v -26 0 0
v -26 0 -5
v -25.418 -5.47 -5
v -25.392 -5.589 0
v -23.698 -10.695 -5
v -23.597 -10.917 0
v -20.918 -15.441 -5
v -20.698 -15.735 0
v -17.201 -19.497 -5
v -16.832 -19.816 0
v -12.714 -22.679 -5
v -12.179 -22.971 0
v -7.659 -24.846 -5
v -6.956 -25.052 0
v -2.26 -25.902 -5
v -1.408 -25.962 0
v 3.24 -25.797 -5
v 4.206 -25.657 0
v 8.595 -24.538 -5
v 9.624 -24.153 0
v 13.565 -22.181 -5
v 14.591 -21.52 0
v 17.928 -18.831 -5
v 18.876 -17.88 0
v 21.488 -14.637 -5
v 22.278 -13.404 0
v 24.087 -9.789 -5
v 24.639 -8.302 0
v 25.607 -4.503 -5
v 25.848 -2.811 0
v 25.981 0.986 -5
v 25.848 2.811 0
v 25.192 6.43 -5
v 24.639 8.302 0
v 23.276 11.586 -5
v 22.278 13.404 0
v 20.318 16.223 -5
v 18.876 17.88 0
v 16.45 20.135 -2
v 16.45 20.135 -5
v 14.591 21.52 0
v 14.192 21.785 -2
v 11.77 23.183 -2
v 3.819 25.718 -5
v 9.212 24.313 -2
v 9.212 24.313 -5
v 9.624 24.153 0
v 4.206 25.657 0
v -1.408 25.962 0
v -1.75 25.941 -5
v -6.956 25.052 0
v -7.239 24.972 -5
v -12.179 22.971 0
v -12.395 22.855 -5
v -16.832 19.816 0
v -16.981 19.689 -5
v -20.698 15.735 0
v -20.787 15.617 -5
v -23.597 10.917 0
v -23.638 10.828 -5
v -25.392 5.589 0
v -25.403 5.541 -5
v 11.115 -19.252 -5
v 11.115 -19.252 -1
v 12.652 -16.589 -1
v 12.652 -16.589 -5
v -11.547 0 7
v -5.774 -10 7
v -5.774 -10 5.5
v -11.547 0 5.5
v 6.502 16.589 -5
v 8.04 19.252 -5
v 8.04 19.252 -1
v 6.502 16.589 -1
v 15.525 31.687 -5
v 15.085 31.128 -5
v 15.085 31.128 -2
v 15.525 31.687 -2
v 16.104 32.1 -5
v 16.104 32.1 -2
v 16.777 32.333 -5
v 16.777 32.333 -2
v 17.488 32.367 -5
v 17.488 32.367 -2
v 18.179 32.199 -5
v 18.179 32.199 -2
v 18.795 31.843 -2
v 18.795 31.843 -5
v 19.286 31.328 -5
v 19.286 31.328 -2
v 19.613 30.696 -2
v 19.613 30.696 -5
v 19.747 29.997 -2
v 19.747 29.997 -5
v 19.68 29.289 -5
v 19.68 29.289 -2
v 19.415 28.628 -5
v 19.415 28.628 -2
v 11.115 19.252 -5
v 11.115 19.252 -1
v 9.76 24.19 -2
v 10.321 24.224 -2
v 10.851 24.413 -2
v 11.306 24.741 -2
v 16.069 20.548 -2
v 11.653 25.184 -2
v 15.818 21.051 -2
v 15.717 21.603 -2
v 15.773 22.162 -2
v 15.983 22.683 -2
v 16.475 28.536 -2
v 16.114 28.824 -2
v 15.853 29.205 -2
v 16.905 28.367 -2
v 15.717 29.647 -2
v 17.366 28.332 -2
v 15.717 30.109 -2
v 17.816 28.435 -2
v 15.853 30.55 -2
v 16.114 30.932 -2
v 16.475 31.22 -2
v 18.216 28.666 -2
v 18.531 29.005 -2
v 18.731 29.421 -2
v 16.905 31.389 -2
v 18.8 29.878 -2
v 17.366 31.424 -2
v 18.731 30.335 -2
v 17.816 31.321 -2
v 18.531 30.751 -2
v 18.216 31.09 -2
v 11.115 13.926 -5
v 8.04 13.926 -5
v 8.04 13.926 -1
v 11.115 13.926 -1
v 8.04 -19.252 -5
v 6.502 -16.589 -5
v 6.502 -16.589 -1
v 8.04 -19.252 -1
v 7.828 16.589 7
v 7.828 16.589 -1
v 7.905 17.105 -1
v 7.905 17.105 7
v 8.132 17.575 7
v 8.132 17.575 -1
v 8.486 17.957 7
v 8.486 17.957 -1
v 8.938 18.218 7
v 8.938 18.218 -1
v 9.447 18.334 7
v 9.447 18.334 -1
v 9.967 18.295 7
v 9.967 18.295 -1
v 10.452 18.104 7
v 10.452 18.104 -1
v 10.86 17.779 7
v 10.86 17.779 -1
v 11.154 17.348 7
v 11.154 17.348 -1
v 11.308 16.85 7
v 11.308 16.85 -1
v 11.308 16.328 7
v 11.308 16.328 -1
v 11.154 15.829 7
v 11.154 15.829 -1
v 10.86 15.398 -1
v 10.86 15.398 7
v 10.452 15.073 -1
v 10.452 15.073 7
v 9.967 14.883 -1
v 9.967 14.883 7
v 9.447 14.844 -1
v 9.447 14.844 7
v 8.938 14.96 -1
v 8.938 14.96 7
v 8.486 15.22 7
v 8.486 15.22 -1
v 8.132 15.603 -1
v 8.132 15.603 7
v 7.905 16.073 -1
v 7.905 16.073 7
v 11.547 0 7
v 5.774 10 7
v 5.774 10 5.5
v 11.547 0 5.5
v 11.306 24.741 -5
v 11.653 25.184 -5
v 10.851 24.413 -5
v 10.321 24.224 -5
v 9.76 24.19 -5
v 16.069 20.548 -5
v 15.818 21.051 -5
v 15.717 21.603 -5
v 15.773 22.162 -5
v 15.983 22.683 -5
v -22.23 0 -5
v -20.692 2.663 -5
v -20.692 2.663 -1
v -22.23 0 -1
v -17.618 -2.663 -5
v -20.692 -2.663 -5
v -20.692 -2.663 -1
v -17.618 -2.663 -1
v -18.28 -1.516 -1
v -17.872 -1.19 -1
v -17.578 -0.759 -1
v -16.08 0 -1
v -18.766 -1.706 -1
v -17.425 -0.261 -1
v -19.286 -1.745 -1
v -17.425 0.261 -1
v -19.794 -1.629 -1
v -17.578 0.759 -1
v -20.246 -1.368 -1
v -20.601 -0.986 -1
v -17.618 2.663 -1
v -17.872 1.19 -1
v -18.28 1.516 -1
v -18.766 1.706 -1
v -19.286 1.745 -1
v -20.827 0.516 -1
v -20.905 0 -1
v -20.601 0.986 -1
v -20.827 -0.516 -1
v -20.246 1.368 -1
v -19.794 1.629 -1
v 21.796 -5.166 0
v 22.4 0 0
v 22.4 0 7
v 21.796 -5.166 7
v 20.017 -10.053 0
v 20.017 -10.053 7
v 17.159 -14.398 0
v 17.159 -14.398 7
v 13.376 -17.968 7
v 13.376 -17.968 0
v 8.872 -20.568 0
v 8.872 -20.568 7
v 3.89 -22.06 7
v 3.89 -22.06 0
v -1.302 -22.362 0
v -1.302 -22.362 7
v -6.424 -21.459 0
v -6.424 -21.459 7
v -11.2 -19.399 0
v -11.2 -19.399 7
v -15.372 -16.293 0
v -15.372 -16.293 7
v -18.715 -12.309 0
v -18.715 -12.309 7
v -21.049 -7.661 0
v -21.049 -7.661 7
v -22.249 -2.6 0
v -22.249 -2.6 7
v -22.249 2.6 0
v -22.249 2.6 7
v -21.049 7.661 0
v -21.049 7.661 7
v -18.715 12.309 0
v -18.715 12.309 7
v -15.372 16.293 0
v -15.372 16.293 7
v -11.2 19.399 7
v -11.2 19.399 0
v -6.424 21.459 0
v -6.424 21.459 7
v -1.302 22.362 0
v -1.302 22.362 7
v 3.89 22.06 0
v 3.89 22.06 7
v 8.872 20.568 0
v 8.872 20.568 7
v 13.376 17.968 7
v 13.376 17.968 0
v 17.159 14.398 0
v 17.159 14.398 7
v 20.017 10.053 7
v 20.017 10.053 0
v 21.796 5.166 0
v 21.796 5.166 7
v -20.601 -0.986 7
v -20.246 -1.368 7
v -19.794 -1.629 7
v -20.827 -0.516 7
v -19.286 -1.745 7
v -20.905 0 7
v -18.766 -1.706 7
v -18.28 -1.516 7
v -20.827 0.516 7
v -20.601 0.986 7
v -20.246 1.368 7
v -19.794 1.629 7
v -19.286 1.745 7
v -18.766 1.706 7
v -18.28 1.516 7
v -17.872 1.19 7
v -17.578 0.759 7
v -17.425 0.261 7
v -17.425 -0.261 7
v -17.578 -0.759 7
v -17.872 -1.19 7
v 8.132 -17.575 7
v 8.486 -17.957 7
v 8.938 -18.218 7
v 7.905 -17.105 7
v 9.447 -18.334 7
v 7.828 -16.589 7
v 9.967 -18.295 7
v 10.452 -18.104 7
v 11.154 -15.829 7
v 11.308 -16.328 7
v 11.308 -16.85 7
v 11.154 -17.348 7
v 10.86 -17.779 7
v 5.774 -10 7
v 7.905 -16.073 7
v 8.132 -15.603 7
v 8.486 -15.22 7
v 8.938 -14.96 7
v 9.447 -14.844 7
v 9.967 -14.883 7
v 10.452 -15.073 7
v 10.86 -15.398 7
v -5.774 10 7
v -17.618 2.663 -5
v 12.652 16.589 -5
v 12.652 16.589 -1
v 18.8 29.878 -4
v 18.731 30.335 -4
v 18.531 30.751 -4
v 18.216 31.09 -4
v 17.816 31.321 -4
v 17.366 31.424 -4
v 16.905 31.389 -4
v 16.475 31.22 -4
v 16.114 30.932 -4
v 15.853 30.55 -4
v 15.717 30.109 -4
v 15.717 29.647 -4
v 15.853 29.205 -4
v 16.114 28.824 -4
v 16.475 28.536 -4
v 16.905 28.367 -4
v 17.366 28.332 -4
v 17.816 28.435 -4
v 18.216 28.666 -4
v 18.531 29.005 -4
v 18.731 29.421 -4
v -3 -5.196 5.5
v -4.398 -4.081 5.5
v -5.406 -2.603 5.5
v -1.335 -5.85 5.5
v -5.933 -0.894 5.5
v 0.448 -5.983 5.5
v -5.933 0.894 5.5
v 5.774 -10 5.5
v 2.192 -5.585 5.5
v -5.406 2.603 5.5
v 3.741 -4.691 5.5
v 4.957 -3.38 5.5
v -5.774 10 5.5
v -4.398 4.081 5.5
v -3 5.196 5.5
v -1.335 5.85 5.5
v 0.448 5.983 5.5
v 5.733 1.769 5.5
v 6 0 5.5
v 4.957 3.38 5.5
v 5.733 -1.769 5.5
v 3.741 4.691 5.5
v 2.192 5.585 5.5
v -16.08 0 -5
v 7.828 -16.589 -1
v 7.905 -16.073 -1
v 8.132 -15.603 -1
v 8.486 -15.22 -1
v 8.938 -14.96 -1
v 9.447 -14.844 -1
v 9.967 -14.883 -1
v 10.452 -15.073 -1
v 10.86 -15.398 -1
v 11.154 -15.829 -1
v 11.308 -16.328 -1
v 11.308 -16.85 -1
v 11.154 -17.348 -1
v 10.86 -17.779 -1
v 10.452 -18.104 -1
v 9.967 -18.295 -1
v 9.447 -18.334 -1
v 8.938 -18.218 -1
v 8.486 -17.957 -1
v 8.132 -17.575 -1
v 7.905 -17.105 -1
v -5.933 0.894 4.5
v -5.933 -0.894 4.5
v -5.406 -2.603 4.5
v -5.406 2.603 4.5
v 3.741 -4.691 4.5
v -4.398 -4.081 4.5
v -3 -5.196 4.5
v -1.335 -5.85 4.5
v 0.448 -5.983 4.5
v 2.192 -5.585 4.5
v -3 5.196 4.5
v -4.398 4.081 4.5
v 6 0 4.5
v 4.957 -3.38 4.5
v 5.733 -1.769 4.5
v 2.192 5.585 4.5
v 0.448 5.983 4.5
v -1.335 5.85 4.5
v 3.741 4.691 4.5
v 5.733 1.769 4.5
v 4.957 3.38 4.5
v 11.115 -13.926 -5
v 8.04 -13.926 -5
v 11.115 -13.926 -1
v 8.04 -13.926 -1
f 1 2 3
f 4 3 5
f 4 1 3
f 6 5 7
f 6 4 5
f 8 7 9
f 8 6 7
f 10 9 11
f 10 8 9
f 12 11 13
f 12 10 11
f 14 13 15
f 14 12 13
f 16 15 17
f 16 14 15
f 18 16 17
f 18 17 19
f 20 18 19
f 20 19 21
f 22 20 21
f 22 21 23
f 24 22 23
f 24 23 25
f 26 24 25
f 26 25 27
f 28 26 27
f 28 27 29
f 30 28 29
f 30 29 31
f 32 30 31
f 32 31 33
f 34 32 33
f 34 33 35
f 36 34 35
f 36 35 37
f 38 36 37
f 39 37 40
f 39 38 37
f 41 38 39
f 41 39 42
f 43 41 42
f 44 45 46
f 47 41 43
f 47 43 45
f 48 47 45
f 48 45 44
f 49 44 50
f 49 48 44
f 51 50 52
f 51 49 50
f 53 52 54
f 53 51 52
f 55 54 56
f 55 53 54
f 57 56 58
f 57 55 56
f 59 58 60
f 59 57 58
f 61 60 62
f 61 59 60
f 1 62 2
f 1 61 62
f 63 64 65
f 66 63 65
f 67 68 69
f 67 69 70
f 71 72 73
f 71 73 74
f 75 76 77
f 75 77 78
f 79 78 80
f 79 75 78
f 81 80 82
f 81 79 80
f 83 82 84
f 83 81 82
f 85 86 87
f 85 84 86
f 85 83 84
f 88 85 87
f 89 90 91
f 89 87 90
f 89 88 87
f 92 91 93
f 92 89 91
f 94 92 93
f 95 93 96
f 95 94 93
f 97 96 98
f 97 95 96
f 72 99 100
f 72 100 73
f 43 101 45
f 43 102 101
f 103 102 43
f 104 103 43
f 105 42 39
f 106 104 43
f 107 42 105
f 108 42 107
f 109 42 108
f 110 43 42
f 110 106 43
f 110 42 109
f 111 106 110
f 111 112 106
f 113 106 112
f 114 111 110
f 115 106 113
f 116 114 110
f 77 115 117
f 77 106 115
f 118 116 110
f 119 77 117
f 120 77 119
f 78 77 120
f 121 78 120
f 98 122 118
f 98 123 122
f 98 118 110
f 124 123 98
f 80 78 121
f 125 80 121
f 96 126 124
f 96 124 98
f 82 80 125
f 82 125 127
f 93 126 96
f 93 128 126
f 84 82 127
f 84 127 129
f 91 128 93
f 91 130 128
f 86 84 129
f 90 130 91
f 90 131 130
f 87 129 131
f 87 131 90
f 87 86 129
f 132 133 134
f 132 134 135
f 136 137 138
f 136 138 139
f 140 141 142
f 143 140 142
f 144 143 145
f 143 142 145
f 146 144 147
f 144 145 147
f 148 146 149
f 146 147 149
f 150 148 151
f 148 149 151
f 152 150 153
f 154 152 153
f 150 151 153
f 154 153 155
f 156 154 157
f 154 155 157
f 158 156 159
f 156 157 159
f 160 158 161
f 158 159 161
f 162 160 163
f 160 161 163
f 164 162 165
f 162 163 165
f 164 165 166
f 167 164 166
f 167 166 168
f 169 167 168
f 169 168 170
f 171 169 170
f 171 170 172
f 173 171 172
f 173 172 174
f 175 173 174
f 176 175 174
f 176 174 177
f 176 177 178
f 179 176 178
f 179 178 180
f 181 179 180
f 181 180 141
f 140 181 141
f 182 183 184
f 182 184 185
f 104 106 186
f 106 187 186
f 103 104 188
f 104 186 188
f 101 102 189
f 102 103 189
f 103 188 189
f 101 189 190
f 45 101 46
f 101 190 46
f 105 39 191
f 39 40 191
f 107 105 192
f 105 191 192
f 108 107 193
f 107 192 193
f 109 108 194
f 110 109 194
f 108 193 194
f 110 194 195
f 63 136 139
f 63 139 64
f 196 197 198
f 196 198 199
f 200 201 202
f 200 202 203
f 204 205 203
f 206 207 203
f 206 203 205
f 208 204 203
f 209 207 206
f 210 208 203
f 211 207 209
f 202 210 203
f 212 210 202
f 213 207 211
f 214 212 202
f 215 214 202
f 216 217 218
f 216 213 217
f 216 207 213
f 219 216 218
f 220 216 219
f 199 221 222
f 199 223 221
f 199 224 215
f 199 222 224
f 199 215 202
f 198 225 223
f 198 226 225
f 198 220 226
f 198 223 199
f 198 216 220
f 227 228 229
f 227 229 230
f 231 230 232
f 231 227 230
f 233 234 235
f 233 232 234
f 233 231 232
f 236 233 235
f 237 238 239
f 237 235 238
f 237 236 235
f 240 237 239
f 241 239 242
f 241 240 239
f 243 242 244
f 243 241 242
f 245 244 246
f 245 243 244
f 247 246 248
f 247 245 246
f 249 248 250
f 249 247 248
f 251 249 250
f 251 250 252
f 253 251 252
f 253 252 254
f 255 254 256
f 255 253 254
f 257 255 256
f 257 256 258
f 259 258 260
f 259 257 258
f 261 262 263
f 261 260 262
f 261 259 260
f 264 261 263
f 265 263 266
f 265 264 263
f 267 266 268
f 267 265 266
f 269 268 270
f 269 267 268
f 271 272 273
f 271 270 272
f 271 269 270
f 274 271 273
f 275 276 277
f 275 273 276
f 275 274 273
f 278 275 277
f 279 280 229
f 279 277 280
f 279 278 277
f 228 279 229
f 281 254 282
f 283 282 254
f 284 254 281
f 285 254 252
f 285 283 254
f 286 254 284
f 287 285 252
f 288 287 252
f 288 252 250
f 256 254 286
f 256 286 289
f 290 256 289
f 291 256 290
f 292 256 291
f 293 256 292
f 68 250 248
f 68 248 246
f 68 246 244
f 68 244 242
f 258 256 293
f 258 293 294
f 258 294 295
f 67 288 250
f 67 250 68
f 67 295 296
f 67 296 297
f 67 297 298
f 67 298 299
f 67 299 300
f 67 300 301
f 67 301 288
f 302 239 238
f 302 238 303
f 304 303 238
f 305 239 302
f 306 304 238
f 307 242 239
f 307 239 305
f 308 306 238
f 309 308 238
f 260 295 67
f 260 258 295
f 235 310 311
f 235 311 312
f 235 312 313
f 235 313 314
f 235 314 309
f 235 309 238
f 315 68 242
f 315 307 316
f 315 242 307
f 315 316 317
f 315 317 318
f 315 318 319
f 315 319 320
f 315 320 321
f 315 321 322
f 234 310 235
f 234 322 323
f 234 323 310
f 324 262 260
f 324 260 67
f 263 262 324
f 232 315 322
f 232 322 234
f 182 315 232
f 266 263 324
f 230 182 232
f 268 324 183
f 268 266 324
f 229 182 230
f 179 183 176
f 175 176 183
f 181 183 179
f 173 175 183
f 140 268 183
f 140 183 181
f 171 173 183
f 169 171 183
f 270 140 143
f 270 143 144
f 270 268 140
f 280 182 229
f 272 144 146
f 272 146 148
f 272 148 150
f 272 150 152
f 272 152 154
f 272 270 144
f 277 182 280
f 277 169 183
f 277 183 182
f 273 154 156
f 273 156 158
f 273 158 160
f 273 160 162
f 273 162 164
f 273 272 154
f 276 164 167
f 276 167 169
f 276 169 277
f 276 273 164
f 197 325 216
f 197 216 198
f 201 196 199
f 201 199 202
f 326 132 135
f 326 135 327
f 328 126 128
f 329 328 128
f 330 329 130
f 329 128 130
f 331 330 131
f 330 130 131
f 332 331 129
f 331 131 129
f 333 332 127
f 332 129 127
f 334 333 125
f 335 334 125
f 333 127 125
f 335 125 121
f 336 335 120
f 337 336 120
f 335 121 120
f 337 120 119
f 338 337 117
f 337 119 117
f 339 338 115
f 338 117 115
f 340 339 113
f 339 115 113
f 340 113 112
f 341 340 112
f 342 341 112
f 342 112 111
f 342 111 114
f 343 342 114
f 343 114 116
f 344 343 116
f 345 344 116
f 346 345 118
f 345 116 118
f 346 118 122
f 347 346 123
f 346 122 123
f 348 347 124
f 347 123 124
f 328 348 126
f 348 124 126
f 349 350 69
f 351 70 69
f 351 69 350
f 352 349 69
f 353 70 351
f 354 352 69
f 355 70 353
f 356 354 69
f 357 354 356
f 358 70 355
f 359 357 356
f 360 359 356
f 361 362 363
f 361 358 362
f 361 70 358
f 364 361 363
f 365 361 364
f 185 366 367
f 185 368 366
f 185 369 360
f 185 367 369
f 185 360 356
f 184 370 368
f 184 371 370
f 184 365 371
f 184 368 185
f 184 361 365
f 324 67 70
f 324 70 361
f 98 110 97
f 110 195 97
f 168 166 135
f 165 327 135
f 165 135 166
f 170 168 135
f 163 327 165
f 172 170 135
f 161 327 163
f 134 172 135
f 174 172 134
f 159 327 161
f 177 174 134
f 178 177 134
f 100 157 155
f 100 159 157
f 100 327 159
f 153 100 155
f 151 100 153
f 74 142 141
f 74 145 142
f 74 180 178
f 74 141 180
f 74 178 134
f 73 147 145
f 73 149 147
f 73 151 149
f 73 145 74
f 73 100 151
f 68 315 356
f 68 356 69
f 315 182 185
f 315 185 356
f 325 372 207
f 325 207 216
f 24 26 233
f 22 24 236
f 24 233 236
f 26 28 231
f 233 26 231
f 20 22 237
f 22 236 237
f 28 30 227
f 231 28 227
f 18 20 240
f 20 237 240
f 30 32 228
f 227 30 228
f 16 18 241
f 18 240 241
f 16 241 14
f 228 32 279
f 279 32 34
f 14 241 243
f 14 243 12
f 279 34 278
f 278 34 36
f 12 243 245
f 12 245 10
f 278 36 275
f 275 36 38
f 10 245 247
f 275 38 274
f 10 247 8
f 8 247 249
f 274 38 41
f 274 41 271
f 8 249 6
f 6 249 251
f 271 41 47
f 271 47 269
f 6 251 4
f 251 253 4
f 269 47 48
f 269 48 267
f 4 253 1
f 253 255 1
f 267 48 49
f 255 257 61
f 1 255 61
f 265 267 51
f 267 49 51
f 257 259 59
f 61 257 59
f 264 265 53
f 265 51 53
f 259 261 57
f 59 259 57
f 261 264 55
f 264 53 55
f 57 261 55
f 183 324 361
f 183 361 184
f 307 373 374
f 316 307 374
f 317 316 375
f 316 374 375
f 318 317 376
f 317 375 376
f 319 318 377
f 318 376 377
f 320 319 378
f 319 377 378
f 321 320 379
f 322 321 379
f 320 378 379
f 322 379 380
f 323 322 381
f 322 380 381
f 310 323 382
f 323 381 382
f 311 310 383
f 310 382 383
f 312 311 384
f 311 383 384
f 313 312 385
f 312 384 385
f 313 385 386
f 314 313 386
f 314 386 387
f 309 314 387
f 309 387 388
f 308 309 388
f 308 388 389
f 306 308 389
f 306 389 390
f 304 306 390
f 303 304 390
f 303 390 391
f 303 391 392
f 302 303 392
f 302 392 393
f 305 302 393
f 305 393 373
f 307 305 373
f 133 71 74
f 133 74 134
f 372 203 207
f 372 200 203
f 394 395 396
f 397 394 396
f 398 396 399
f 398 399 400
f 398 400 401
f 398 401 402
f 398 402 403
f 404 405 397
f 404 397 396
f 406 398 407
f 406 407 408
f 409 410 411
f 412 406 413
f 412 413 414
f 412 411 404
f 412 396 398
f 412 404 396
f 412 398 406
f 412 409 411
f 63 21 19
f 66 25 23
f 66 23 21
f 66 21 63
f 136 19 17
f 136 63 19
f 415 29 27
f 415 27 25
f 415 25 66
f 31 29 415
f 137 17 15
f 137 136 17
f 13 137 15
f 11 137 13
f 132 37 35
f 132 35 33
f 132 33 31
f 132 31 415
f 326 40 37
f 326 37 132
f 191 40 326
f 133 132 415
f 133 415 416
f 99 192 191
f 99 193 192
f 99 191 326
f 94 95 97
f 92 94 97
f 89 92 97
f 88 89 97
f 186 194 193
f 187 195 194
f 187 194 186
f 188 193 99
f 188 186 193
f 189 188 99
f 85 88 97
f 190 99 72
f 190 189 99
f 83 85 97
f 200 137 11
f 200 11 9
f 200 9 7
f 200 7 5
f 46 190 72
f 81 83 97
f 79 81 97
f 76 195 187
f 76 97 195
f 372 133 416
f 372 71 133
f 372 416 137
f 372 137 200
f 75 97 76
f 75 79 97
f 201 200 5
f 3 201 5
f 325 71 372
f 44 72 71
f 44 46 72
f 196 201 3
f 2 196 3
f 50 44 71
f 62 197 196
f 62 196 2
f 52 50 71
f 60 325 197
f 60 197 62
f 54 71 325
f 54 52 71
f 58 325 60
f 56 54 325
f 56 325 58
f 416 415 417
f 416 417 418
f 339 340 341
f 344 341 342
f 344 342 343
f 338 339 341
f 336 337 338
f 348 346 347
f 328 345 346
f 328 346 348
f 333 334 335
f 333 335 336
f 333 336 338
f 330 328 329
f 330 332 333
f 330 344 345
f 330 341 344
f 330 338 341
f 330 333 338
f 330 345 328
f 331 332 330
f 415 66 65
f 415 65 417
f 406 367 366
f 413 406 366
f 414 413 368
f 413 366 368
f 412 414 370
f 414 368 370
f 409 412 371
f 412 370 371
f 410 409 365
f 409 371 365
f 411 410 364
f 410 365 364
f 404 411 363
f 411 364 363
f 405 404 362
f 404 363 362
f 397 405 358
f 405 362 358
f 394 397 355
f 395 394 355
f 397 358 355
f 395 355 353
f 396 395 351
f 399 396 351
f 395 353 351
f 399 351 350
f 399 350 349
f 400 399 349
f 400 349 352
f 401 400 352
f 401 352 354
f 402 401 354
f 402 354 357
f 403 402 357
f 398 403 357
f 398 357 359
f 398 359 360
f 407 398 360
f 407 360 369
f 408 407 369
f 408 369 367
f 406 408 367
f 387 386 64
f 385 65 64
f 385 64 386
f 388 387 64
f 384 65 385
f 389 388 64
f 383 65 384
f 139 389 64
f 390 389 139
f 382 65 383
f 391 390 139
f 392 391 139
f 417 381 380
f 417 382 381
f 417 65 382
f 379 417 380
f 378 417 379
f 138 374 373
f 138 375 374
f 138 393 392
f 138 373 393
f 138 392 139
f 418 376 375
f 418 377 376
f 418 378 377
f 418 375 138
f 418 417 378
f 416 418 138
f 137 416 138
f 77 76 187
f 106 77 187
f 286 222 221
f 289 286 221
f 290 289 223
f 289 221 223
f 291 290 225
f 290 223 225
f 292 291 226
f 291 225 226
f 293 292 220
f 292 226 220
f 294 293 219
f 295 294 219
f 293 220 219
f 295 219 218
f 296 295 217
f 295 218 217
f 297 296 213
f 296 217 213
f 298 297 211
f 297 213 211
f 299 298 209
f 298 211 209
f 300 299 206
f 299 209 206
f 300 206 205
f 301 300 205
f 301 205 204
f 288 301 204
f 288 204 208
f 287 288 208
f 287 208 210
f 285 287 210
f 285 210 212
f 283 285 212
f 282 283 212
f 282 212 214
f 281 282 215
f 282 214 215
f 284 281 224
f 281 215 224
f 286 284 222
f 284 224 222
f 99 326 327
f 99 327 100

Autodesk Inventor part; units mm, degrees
ref_plane "YZ Plane" through (0, 0, 0) normal (1, 0, 0) x (0, 1, 0)
ref_plane "XZ Plane" through (0, 0, 0) normal (0, 1, 0) x (-1, 0, 0)
sketch "Sketch1" plane through (0, 0, 0) normal (0, 0, 1) x (1, 0, 0)
  circle A0 centre (0, 0) radius 22.4
  dimension "d0" = 44.8
extrude "Extrusion1" add sketch "Sketch1" along normal blind 7
sketch "Sketch2" plane through (0, 0, 0) normal (0, 0, -1) x (-1, 0, 0)
  circle A0 centre (0, 0) radius 26
  dimension "d3" = 52
extrude "Extrusion2" add sketch "Sketch2" along normal blind 5
sketch "Sketch3" plane through (0, 0, -5) normal (0, 0, -1) x (-1, 0, 0)
  line L0 (22.23, 0) -> (20.6925, -2.663)
  line L1 (20.6925, -2.663) -> (17.6175, -2.663)
  line L2 (17.6175, -2.663) -> (16.08, 0)
  line L3 (16.08, 0) -> (17.6175, 2.663)
  line L4 (17.6175, 2.663) -> (20.6925, 2.663)
  line L5 (20.6925, 2.663) -> (22.23, 0)
  line L6 (-11.115, 19.2517) -> (-8.04, 19.2517)
  line L7 (-8.04, 19.2517) -> (-6.5025, 16.5887)
  line L8 (-6.5025, 16.5887) -> (-8.04, 13.9257)
  line L9 (-8.04, 13.9257) -> (-11.115, 13.9257)
  line L10 (-11.115, 13.9257) -> (-12.6525, 16.5887)
  line L11 (-12.6525, 16.5887) -> (-11.115, 19.2517)
  line L12 (-11.115, -19.2517) -> (-12.6525, -16.5887)
  line L13 (-12.6525, -16.5887) -> (-11.115, -13.9257)
  line L14 (-11.115, -13.9257) -> (-8.04, -13.9257)
  line L15 (-8.04, -13.9257) -> (-6.5025, -16.5887)
  line L16 (-6.5025, -16.5887) -> (-8.04, -19.2517)
  line L17 (-8.04, -19.2517) -> (-11.115, -19.2517)
  point P0 (0, 0)
  point P1 (19.155, 0)
  point P2 (-9.5775, 16.5887)
  point P3 (-9.5775, -16.5887)
  dimension "d6" = 3.075
  dimension "d7" = 19.155
  dimension "d10" = 360
extrude "Extrusion3" cut sketch "Sketch3" against normal blind 4
sketch "Sketch4" plane through (0, 0, -5) normal (0, 0, -1) x (-1, 0, 0)
  circle A0 centre (19.155, 0) radius 1.75
  circle A1 centre (-9.5775, 16.5887) radius 1.75
  circle A2 centre (-9.5775, -16.5887) radius 1.75
  point P0 (0, 0)
  dimension "d14" = 3.5
  dimension "d15" = 19.155
  dimension "d18" = 360
extrude "Extrusion4" cut sketch "Sketch4" against normal through all
sketch "Sketch5" plane through (0, 0, 7) normal (0, 0, 1) x (1, 0, 0)
  line L0 (-11.547, 0) -> (-5.7735, 10)
  line L1 (-5.7735, 10) -> (5.7735, 10)
  line L2 (5.7735, 10) -> (11.547, 0)
  line L3 (11.547, 0) -> (5.7735, -10)
  line L4 (5.7735, -10) -> (-5.7735, -10)
  line L5 (-5.7735, -10) -> (-11.547, 0)
  point P0 (0, 0)
  point P1 (0, 0)
  dimension "d22" = 10
extrude "Extrusion5" cut sketch "Sketch5" against normal blind 1.5
ref_plane "Work Plane1" through (0, 0, 6.5) normal (0, 0, 1) x (1, 0, 0)
sketch "Sketch6" plane through (0, 0, 6.5) normal (0, 0, 1) x (1, 0, 0)
  circle A0 centre (0, 0) radius 22.5
  circle A1 centre (0, 0) radius 22.4 projected
  circle A2 centre (0, 0) radius 21.1
  dimension "d26" = 45
  dimension "d27" = 42.2
extrude "Extrusion6" [suppressed]
sketch "Sketch7" plane through (0, 0, -5) normal (0, 0, -1) x (-1, 0, 0)
  point P0 (0, 0)
sketch "Sketch8" plane through (0, 0, -5) normal (0, 0, 1) x (1, 0, 0)
  line L0 (0, 0) -> (17.25, 29.8779)
  line L1 (0, 0) -> (34.5, 0) construction
  circle A0 centre (0, 0) radius 26 projected
  line L2 (13, 22.5167) -> (17.25, 29.8779) construction
  line L3 (15.1651, 21.2667) -> (19.4151, 28.6279)
  line L4 (15.0849, 31.1279) -> (10.8349, 23.7667)
  arc A1 (10.8349, 23.7667) -> (15.1651, 21.2667) centre (13, 22.5167) ccw
  arc A2 (19.4151, 28.6279) -> (15.0849, 31.1279) centre (17.25, 29.8779) ccw
  point P0 (15.125, 26.1973)
  point P1 (10.7773, 23.6611)
  point P2 (15.1025, 21.164)
  dimension "d30" = 34.5
  dimension "d31" = 60
  dimension "d32" = 5
extrude "Extrusion7" add sketch "Sketch8" along normal blind 3 contours A0 A1 L4 A2 L3
sketch "Sketch9" plane through (0, 0, -2) normal (0, 0, 1) x (1, 0, 0)
  arc A0 (19.4151, 28.6279) -> (15.0849, 31.1279) centre (17.25, 29.8779) ccw projected
  circle A1 centre (17.25, 29.8779) radius 1.55
  point P0 (0, 0)
  dimension "d35" = 3.1
extrude "Extrusion8" cut sketch "Sketch9" against normal blind 2
fillet "Fillet1" radius 2 2 edges at (15.1025, 21.164, -3.5) (10.7773, 23.6611, -3.5)
sketch "Sketch10" plane through (0, 0, 5.5) normal (0, 0, 1) x (1, 0, 0)
  circle A0 centre (0, 0) radius 6
  dimension "d39" = 12
extrude "Extrusion9" cut sketch "Sketch10" against normal blind 1
properties part number "Planet_Carrier_Top"
